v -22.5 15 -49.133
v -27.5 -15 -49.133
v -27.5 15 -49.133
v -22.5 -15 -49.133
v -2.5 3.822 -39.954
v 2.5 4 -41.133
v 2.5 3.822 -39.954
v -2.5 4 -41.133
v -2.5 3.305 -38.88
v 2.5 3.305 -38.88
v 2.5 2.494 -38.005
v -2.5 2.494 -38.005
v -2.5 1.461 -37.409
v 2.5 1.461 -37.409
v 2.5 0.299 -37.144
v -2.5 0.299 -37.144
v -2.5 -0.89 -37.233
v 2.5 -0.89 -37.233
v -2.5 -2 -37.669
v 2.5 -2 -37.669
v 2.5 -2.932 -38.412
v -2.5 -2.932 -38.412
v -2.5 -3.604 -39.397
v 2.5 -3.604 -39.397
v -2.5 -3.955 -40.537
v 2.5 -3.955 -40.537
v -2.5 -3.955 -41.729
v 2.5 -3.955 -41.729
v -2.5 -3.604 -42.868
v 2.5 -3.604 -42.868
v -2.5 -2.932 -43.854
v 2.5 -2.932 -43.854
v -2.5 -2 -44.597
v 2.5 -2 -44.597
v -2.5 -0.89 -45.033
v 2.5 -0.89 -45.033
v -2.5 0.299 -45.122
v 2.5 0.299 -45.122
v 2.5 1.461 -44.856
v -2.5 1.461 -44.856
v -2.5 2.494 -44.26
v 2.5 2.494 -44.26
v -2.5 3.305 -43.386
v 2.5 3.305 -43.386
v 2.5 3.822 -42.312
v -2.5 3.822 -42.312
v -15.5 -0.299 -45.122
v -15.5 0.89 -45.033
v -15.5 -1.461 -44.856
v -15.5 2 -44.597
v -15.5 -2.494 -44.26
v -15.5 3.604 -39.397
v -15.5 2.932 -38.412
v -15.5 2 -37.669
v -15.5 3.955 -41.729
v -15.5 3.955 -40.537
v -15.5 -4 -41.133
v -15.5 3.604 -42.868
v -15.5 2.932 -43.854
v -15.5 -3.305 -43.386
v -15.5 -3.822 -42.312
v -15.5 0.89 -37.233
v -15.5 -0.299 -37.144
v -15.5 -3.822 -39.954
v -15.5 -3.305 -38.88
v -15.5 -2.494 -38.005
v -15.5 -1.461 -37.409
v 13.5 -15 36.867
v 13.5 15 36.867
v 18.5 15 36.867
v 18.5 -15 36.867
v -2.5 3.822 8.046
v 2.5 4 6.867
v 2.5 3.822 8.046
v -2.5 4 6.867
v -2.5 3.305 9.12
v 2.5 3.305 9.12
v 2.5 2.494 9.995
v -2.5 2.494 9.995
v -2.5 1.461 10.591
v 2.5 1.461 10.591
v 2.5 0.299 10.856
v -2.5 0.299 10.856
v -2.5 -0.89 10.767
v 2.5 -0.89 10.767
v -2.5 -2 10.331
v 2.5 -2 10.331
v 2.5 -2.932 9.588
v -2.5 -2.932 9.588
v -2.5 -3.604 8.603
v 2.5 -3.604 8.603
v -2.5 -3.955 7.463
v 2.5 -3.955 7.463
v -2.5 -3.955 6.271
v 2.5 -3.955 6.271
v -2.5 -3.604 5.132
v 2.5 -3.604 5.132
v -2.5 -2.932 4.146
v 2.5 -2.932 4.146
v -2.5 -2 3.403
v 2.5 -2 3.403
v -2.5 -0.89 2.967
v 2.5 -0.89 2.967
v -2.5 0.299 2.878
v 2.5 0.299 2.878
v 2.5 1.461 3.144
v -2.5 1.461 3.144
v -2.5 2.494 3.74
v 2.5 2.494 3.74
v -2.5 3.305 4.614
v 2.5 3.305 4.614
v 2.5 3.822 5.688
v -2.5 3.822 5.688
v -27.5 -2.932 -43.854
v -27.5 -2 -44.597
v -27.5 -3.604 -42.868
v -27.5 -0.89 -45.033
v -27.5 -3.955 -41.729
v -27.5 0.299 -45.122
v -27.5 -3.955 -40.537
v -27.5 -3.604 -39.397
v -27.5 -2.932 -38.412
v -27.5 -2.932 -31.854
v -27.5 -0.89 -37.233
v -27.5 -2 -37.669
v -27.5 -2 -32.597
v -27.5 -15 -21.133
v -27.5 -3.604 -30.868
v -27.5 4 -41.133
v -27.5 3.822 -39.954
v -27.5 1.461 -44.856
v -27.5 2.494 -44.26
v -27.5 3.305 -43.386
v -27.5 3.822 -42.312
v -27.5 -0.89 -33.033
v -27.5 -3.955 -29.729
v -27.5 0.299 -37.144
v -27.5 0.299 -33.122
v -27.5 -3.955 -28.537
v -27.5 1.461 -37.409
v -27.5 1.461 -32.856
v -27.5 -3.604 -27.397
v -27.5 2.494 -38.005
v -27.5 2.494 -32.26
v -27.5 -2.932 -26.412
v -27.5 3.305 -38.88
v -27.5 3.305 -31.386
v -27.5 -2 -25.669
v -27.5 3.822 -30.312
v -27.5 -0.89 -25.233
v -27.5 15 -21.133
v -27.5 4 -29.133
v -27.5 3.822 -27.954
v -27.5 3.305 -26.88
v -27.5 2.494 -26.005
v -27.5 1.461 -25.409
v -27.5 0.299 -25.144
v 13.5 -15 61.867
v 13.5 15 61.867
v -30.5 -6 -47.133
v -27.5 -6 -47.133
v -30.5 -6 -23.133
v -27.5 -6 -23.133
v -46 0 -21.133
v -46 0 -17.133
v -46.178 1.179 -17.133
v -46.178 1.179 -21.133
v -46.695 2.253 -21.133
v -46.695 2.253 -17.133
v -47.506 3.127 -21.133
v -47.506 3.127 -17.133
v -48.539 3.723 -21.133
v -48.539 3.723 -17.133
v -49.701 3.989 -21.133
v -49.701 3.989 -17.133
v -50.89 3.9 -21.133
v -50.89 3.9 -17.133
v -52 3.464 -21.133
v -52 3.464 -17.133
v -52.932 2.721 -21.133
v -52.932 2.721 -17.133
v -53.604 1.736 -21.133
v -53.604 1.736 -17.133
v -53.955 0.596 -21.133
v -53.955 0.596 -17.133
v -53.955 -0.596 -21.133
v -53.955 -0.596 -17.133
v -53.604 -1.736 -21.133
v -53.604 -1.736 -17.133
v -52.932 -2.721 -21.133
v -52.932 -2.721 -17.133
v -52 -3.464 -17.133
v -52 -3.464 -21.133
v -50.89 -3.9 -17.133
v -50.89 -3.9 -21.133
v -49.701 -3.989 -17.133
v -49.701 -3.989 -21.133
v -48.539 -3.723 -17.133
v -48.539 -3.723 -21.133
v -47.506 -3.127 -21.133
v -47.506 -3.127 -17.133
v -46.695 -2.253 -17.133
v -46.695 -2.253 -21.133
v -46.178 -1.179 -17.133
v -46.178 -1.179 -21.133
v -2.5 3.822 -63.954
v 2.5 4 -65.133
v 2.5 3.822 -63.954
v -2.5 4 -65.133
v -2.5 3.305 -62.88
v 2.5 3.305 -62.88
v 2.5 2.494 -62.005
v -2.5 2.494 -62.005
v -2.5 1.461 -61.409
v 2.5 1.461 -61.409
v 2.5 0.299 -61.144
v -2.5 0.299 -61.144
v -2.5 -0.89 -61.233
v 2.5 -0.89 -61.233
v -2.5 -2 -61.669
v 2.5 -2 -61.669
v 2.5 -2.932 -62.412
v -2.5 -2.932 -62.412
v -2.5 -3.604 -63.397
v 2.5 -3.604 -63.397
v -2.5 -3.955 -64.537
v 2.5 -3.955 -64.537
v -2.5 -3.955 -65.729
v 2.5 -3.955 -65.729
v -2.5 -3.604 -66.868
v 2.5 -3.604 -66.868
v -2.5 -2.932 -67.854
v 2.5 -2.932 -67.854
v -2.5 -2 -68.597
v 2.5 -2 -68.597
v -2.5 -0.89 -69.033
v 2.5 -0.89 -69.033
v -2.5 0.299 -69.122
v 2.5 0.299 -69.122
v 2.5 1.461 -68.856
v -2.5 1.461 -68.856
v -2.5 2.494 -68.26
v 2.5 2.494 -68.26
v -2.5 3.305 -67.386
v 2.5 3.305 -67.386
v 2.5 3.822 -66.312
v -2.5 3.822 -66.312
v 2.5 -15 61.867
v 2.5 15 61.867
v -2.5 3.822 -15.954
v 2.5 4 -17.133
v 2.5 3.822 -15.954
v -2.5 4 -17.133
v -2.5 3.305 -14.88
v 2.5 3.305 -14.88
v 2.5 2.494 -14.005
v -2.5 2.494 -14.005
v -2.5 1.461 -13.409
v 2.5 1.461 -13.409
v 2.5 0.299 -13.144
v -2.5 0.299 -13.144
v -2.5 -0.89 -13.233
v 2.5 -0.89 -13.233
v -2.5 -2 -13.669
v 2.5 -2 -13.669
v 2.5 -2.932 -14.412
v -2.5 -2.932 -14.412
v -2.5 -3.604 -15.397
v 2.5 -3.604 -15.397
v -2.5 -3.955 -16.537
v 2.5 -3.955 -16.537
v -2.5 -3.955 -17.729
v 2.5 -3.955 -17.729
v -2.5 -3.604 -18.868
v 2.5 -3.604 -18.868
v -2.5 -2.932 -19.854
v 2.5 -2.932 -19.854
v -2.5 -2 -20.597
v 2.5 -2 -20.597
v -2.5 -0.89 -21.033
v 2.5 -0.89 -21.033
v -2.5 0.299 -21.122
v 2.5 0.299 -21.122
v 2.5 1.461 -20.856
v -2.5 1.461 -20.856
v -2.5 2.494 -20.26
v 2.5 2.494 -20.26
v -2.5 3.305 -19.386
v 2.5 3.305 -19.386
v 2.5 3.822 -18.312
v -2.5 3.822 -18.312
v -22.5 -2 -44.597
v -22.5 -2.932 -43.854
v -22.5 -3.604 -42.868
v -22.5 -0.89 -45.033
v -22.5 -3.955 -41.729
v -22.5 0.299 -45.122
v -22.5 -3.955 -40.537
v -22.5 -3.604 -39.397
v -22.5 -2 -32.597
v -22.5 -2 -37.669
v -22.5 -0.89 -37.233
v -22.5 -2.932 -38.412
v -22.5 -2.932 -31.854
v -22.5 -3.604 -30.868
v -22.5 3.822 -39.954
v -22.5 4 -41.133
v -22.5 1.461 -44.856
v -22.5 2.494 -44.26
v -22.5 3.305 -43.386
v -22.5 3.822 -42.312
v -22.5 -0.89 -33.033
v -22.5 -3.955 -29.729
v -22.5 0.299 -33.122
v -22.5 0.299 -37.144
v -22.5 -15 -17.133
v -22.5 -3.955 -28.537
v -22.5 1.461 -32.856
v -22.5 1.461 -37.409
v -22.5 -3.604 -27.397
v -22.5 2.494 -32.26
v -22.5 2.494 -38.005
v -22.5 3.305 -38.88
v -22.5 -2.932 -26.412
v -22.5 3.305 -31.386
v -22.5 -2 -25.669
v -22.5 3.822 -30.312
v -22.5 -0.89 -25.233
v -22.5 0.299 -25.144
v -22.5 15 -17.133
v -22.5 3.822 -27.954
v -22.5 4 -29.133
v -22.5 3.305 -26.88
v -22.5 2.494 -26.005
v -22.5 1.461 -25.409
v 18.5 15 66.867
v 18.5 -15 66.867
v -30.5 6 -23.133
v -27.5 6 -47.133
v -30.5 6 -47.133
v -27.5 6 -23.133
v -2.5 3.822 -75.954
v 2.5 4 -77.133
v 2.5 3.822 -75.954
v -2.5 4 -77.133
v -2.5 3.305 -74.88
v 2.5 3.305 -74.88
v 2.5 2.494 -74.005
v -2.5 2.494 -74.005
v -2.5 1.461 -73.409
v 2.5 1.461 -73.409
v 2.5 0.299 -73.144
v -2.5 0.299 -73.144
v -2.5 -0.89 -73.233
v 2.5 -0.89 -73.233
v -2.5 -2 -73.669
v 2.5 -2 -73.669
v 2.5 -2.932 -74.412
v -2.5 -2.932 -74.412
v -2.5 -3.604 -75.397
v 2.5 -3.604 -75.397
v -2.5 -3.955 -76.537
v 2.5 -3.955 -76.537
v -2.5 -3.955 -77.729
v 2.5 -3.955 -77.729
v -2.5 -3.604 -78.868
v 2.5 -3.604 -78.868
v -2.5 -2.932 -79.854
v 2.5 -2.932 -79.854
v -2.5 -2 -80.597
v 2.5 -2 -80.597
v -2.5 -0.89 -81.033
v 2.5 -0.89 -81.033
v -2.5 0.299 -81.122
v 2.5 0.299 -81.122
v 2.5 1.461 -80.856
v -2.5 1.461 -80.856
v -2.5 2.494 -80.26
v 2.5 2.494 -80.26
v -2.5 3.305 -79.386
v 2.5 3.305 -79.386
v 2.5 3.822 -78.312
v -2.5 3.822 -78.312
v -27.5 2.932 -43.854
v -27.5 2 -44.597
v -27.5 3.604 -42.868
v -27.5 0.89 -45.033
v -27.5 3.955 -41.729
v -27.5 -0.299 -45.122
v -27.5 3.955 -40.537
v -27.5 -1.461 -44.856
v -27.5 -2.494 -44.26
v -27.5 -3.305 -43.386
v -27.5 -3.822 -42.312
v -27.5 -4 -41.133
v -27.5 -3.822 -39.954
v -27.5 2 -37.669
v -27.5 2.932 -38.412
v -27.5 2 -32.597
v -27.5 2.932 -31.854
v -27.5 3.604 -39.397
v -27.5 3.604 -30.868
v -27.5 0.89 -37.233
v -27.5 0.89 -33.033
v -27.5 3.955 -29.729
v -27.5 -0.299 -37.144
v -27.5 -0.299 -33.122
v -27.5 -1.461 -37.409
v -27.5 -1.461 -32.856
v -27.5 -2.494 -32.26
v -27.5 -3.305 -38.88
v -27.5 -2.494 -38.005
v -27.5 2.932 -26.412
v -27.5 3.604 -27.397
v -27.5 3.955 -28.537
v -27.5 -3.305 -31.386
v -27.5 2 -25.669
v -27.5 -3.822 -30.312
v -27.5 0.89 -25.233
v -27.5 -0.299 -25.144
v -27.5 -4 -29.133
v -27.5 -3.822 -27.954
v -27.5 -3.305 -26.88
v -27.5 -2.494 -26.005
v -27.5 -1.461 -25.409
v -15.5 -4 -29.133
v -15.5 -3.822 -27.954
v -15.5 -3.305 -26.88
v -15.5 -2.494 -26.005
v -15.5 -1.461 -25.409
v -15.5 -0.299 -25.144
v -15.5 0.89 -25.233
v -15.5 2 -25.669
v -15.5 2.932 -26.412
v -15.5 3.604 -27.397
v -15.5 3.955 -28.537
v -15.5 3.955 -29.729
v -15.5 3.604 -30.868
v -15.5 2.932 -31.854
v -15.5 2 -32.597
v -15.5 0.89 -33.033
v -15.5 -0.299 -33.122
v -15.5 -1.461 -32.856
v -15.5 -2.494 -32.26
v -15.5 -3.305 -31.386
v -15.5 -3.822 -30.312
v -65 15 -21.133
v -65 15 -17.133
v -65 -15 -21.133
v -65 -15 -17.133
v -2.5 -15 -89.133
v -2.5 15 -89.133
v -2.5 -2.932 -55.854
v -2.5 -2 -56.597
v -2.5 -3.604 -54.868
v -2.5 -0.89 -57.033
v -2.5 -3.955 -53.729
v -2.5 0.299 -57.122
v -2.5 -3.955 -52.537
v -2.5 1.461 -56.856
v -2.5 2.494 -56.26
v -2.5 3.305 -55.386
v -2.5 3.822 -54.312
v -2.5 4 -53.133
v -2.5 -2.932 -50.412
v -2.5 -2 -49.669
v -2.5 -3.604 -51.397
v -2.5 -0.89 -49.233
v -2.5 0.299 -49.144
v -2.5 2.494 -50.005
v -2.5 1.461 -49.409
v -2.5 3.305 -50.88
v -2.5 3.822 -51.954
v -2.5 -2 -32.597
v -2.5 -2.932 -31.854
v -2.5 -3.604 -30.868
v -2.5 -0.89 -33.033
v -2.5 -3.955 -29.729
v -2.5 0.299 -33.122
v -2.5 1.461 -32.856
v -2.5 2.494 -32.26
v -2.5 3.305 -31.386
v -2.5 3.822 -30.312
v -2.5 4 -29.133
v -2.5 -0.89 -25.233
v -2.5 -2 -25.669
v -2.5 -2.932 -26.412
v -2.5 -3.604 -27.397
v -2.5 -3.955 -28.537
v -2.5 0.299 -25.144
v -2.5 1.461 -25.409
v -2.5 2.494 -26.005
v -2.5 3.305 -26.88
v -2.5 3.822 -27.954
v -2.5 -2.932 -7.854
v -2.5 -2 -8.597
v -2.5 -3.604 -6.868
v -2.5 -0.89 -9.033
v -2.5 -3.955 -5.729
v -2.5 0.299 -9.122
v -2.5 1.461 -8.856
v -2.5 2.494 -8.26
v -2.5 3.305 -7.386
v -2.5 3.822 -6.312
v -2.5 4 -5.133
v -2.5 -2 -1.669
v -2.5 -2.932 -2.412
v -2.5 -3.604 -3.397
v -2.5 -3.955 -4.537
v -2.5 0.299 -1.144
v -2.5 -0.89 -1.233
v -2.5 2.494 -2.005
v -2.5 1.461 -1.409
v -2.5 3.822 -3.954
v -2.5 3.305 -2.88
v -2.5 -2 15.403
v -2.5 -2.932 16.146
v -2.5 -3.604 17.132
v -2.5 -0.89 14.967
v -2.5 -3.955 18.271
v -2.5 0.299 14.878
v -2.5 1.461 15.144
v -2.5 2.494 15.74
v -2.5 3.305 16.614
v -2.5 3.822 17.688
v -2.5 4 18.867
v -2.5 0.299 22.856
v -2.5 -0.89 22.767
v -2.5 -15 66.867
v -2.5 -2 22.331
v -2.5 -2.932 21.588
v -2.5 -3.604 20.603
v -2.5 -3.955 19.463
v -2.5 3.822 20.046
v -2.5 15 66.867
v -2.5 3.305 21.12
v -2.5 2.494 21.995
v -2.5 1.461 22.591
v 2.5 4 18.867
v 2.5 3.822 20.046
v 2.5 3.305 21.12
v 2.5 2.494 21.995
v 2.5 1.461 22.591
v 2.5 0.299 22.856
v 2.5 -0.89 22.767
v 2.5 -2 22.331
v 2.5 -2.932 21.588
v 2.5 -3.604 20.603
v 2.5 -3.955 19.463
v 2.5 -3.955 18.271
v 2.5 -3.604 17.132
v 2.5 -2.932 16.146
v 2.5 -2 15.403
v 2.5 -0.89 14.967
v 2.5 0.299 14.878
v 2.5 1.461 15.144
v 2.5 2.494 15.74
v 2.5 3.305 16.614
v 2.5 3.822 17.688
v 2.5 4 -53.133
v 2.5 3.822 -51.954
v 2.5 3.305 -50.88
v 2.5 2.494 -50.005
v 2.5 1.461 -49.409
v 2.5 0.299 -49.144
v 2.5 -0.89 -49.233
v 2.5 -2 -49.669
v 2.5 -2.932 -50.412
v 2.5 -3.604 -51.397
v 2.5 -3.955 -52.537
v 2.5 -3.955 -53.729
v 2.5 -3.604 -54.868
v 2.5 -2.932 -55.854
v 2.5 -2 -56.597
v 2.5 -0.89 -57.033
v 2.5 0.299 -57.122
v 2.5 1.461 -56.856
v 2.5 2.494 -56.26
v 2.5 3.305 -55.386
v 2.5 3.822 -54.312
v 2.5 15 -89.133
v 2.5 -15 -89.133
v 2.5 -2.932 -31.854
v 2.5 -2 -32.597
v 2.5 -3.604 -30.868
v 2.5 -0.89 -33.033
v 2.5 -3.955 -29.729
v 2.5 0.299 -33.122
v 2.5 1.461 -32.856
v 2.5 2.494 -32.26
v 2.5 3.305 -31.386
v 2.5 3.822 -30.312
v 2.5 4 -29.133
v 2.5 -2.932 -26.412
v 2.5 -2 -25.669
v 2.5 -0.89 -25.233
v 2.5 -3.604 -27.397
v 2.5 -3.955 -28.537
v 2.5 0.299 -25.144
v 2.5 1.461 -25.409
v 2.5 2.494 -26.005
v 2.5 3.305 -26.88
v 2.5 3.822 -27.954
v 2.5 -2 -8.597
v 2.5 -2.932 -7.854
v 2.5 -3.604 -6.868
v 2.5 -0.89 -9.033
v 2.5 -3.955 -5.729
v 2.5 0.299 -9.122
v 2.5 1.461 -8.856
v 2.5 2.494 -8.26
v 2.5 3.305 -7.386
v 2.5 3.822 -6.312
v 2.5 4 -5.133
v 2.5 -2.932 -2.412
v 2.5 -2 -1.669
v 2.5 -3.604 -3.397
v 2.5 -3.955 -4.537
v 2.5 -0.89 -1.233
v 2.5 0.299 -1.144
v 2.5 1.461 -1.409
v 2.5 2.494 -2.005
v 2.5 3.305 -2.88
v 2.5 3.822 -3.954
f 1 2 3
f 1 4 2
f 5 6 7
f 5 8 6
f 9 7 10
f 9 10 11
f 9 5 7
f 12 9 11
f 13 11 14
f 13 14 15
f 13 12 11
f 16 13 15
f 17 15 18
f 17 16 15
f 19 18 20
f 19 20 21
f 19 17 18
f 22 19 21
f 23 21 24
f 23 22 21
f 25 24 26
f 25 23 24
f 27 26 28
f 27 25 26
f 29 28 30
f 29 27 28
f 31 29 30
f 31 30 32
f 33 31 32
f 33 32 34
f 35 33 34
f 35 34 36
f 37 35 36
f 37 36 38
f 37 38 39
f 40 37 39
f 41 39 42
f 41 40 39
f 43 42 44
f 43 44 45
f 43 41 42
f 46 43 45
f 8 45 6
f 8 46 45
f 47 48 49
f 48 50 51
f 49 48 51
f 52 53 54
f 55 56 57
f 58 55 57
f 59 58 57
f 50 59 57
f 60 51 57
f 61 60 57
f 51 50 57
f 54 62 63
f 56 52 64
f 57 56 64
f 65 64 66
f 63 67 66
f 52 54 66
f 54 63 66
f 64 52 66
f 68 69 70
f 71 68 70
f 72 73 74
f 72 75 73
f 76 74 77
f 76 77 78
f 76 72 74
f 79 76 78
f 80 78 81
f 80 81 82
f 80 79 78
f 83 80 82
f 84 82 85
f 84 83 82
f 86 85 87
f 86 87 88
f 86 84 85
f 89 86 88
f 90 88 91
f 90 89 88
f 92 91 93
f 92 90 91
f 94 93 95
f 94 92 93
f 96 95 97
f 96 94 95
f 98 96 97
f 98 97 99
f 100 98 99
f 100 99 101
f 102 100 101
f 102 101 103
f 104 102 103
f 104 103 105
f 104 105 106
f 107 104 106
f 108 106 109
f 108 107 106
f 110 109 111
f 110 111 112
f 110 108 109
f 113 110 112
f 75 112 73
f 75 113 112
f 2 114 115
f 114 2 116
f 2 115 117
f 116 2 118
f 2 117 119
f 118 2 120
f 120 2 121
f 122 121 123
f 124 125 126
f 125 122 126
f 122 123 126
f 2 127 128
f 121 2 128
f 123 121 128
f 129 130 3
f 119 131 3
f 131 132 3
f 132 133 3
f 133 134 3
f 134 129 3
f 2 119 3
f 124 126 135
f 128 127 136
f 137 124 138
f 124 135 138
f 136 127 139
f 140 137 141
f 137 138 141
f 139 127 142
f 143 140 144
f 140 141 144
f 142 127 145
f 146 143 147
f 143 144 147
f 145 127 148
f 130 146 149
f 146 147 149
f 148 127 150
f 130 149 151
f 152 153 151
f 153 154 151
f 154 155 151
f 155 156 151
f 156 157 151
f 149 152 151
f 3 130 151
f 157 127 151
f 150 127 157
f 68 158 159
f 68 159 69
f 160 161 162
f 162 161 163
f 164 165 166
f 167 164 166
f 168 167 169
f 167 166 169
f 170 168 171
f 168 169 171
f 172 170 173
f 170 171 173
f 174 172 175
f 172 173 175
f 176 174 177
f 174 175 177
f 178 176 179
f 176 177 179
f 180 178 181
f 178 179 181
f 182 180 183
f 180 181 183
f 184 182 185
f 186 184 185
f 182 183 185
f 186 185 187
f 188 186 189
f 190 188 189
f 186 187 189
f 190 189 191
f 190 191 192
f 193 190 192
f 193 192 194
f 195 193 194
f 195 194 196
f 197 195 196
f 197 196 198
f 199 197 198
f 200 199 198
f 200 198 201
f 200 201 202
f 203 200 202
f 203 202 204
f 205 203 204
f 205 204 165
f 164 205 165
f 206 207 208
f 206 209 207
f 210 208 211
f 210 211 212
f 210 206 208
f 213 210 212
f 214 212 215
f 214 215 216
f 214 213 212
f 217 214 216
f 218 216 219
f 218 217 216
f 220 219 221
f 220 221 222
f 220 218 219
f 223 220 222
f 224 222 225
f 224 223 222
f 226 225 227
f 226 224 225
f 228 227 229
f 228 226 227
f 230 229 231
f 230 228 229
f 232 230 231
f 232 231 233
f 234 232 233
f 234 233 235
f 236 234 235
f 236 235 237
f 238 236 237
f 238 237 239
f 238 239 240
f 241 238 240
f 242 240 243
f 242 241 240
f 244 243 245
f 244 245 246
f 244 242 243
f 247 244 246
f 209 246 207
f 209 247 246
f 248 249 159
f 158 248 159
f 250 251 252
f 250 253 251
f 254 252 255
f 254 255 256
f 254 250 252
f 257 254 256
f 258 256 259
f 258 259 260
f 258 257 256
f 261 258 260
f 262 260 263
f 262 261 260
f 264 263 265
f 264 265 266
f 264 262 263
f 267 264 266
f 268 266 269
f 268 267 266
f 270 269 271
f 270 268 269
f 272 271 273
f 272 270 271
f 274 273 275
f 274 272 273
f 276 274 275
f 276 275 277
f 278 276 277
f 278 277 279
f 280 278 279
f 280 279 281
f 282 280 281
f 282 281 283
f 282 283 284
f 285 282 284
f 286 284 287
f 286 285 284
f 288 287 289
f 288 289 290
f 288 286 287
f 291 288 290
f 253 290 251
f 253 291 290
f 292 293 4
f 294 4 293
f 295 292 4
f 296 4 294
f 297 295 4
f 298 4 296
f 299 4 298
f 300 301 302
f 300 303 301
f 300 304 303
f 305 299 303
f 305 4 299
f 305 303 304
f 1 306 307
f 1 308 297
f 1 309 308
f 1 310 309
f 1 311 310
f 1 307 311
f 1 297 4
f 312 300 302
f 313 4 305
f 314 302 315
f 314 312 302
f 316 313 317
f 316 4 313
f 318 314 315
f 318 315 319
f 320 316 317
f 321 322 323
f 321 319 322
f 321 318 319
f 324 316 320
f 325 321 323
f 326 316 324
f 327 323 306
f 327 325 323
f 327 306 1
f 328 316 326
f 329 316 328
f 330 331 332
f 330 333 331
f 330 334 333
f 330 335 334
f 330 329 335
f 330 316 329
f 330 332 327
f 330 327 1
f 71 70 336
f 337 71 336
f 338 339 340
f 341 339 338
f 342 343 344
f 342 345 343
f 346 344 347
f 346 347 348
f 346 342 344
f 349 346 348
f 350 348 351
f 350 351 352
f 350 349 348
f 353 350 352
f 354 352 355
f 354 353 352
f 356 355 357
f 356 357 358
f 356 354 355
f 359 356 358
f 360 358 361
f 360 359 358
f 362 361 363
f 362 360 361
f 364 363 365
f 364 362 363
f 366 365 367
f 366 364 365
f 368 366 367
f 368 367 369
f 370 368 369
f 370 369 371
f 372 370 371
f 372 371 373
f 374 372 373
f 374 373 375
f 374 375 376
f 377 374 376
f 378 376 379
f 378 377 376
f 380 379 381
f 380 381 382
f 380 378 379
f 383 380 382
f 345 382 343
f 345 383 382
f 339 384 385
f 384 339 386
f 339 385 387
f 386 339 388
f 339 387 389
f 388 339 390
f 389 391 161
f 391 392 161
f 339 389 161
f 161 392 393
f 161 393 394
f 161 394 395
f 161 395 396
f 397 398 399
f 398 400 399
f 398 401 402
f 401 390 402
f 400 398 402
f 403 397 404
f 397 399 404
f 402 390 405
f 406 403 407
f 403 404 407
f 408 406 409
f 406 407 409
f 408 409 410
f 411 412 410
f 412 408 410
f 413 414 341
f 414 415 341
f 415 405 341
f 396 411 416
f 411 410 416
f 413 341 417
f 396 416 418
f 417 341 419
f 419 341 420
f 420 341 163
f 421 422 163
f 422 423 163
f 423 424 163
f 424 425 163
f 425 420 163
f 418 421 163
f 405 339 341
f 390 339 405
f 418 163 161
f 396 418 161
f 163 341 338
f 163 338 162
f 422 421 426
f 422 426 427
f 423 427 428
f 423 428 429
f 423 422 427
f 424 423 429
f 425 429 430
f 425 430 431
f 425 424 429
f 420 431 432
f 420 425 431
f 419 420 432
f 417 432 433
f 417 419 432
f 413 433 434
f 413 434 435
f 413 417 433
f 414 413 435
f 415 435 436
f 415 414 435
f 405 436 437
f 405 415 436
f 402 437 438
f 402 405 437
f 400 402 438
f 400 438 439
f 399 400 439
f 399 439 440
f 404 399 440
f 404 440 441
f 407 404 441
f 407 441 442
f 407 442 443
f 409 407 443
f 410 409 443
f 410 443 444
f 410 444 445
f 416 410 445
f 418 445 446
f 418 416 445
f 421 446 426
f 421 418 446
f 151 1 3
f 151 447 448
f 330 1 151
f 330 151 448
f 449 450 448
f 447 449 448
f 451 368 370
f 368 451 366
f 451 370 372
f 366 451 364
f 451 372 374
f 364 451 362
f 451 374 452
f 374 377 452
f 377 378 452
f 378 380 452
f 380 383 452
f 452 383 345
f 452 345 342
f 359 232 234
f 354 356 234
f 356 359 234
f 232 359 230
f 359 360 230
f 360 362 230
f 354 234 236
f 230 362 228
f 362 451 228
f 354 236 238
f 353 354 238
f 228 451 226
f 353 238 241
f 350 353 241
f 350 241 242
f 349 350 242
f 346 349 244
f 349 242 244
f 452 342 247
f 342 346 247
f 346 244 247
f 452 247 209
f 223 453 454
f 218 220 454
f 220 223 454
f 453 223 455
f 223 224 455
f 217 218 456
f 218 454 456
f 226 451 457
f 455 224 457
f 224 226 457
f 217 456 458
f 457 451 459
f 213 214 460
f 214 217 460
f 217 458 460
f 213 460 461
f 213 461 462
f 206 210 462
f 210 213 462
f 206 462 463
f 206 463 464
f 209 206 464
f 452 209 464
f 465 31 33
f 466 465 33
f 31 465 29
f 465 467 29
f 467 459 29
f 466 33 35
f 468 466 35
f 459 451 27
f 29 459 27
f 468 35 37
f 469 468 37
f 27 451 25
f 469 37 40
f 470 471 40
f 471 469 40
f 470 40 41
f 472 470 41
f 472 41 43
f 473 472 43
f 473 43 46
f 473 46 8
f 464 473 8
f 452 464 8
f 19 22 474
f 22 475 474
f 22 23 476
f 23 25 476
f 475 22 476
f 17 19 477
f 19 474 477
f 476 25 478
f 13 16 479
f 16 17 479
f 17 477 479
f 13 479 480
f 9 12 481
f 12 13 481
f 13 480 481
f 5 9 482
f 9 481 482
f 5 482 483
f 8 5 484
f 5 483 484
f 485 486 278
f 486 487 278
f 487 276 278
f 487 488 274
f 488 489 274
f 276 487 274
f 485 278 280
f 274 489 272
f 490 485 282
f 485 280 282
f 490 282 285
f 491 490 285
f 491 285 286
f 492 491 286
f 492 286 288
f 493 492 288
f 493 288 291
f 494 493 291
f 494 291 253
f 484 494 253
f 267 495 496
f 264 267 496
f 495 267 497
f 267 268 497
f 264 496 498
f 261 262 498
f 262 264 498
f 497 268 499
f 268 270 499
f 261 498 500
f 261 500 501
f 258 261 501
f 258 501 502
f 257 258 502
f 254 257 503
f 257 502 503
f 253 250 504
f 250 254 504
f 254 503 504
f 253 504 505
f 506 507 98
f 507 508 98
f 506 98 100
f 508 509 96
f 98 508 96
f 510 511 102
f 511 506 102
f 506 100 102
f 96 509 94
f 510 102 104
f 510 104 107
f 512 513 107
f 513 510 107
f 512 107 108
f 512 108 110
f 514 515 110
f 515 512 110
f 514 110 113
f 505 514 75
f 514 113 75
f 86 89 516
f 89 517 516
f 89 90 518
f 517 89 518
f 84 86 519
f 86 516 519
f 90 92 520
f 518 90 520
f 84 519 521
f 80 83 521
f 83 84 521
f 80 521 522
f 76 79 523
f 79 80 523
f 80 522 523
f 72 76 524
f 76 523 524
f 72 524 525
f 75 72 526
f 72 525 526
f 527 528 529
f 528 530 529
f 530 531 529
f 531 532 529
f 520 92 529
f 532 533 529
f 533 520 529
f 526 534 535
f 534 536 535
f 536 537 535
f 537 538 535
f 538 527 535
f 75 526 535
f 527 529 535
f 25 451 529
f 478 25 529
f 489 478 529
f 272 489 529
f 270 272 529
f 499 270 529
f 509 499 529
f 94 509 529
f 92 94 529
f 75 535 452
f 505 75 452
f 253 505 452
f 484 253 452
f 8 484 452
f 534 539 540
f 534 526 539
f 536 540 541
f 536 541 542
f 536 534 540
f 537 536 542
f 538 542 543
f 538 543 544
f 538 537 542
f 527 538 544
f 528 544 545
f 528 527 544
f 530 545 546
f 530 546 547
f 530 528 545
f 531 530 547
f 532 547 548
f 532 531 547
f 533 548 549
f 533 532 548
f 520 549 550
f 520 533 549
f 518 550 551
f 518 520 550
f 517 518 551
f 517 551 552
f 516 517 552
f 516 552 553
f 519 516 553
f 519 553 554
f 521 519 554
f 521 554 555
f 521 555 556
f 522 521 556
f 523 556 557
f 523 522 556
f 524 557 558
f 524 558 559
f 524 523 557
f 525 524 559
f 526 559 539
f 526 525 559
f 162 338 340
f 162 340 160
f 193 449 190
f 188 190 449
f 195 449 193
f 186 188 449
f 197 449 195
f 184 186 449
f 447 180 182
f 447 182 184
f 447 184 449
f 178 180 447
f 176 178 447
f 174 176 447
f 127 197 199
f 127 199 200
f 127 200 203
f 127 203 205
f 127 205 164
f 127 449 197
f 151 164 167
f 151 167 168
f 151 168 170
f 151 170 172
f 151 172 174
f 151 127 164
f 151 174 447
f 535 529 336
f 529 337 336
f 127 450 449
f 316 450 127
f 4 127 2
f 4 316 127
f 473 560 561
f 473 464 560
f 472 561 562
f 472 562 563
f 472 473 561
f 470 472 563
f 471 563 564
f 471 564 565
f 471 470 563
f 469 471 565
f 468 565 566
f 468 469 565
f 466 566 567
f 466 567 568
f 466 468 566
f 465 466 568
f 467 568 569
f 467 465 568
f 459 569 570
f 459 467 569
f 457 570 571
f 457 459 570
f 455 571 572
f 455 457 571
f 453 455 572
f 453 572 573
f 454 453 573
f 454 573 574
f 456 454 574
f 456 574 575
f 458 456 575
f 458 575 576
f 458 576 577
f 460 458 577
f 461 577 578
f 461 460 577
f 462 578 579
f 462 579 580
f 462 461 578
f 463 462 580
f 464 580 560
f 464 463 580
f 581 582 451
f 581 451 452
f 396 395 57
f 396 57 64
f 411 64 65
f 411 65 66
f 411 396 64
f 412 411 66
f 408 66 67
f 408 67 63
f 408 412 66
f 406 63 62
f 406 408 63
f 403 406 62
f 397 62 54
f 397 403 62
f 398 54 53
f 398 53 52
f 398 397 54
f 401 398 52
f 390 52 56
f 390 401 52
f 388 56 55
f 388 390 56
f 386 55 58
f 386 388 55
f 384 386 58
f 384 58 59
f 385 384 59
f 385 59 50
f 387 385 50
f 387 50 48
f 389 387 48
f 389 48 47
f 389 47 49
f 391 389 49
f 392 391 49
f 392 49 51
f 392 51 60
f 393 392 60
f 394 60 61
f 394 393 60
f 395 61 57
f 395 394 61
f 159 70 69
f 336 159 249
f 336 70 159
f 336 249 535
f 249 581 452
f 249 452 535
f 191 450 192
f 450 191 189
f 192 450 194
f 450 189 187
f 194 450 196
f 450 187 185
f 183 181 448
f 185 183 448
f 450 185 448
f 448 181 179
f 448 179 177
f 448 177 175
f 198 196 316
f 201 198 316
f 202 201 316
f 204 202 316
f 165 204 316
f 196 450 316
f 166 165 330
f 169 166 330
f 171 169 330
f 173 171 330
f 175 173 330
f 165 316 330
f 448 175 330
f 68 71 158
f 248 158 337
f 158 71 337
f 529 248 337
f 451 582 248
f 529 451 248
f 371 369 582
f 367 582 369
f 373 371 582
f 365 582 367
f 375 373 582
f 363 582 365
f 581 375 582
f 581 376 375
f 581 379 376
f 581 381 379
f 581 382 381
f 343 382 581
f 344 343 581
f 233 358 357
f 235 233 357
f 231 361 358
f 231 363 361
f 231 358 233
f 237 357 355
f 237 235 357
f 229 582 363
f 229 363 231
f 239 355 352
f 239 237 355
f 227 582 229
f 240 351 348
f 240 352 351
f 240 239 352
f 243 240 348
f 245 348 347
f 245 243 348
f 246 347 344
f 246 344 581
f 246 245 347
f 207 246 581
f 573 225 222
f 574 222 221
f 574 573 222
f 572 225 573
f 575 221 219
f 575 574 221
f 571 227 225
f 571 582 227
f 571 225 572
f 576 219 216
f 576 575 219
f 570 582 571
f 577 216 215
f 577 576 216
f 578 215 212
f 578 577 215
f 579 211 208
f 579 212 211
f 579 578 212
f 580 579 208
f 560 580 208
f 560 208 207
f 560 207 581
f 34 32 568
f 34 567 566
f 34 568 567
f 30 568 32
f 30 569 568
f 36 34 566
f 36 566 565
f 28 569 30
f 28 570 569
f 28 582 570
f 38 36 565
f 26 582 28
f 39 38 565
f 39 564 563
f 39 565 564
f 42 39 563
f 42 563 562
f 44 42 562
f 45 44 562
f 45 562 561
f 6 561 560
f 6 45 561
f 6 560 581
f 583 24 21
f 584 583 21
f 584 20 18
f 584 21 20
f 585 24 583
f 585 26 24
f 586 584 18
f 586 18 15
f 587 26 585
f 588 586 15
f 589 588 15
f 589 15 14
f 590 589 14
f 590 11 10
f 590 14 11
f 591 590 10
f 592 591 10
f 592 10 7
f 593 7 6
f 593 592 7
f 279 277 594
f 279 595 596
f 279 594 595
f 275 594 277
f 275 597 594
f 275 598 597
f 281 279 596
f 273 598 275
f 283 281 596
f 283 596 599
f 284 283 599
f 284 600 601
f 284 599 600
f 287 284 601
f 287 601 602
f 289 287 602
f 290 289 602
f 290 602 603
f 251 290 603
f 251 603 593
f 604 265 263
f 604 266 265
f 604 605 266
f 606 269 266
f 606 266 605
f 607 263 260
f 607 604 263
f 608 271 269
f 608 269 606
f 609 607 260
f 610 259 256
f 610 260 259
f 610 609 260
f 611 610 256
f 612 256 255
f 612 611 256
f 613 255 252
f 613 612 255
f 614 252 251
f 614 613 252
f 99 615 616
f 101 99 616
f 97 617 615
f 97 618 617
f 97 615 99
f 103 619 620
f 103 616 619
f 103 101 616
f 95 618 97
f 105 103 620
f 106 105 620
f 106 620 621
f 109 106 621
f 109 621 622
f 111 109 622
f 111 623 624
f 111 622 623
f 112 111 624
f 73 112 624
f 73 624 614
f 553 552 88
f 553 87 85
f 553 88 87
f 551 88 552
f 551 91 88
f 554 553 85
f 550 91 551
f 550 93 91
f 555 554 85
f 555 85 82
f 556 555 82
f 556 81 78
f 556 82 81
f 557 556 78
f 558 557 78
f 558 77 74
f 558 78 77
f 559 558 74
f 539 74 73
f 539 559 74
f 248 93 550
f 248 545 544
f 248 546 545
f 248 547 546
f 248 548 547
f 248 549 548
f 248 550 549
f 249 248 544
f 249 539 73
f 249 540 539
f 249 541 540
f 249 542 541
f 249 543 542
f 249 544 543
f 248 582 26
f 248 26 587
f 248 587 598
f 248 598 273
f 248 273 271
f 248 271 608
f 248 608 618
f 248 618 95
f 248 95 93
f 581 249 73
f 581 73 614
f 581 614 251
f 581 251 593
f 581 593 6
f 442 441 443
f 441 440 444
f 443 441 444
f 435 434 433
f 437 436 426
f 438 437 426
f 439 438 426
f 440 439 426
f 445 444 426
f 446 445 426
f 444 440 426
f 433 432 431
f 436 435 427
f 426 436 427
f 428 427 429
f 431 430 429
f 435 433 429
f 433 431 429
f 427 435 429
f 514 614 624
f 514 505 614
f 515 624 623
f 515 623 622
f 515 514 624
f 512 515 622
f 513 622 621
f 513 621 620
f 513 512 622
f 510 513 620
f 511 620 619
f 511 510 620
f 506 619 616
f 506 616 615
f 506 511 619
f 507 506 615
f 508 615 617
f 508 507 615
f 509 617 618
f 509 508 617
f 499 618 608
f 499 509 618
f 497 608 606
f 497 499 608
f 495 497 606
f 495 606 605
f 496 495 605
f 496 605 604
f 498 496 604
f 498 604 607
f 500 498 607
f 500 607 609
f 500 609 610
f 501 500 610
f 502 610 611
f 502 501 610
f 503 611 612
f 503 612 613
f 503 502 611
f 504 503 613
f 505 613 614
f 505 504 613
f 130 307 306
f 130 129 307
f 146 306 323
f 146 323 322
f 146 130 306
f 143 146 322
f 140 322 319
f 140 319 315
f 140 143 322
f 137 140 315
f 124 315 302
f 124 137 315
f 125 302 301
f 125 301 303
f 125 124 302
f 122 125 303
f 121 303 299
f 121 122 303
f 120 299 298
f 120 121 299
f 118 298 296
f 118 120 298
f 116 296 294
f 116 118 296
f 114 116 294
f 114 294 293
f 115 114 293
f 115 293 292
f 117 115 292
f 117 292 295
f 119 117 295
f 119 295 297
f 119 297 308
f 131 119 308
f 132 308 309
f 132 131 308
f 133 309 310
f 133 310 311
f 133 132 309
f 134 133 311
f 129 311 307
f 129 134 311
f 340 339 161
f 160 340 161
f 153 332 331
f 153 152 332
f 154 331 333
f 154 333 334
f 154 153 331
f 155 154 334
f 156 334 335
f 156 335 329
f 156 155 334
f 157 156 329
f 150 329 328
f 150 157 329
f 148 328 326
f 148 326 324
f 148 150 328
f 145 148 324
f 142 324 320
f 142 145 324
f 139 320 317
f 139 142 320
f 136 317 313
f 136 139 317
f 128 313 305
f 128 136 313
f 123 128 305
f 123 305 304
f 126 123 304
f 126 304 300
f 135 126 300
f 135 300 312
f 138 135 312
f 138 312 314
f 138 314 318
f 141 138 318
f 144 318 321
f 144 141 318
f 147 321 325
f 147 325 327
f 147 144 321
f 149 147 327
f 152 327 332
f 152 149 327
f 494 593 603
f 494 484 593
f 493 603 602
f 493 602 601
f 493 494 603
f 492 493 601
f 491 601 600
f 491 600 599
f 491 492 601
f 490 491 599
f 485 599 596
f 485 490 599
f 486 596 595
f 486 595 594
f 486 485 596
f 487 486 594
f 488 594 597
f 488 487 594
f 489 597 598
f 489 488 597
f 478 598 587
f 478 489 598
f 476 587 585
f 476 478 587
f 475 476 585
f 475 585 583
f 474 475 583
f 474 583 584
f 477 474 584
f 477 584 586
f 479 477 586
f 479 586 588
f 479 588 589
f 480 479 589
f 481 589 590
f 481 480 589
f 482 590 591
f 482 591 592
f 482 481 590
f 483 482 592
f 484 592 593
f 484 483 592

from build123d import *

# Parameters (mm, degrees)
F1_W           = 30
F1_H           = 156
F1_R           = 4
F2_DEPTH       = 2.5
F2_DEPTH_BACK  = 2.5
F4_DEPTH       = 15
F4_DEPTH_BACK  = 15
F6_W           = 30
F6_H           = 28
F6_R           = 4
F6_H_2         = 4
F7_DEPTH       = 2.5
F7_DEPTH_BACK  = 2.5
F8_DEPTH       = 40
F9_R           = 4
F10_DEPTH      = 5
F10_DEPTH_BACK = 5
F11_W          = 12
F11_H          = 24
F12_DEPTH      = 3
F11_R          = 4
F13_DEPTH      = 12
F13_DEPTH_BACK = 3


with BuildPart() as f2:
    # F1 (on Right) → F2 (new body, two sides)
    with BuildSketch(Plane.YZ) as f2_sk:
        with Locations((0, -11.1328125)):
            Rectangle(F1_W, F1_H)
        with Locations((0, -77.1328125)):
            Circle(F1_R, mode=Mode.SUBTRACT)
        with Locations((0, -65.1328125)):
            Circle(F1_R, mode=Mode.SUBTRACT)
        with Locations((0, -53.1328125)):
            Circle(F1_R, mode=Mode.SUBTRACT)
        with Locations((0, -41.1328125)):
            Circle(F1_R, mode=Mode.SUBTRACT)
        with Locations((0, -29.1328125)):
            Circle(F1_R, mode=Mode.SUBTRACT)
        with Locations((0, -17.1328125)):
            Circle(F1_R, mode=Mode.SUBTRACT)
        with Locations((0, -5.1328125)):
            Circle(F1_R, mode=Mode.SUBTRACT)
        with Locations((0, 6.8671875)):
            Circle(F1_R, mode=Mode.SUBTRACT)
        with Locations((0, 18.8671875)):
            Circle(F1_R, mode=Mode.SUBTRACT)
    extrude(amount=F2_DEPTH)
    extrude(f2_sk.sketch, amount=-F2_DEPTH_BACK)

    # F3 (on Front) → F4 (join, two sides)
    with BuildSketch(Plane.XZ) as f4_sk:
        Polygon((2.5, 66.8671875), (-2.5, 66.8671875), (-2.5, 61.8671875), (13.5, 61.8671875), (13.5, 36.8671875), (18.5, 36.8671875), (18.5, 61.8671875), (18.5, 66.8671875), (13.5, 66.8671875), align=None)
    extrude(amount=F4_DEPTH)
    extrude(f4_sk.sketch, amount=-F4_DEPTH_BACK)


with BuildPart() as f7:
    # F6 (on offset) → F7 (new body, two sides)
    with BuildSketch(Plane.YZ.offset(-25)) as f7_sk:
        with Locations((0, -35.1328125)):
            Rectangle(F6_W, F6_H)
        with Locations((0, -41.1328125)):
            Circle(F6_R, mode=Mode.SUBTRACT)
        with Locations((0, -29.1328125)):
            Circle(F6_R, mode=Mode.SUBTRACT)
        with Locations((0, -19.1328125)):
            Rectangle(F6_W, F6_H_2)
    extrude(amount=F7_DEPTH)
    extrude(f7_sk.sketch, amount=-F7_DEPTH_BACK)

    # F6 (on offset) → F8 (join)
    with BuildSketch(Plane.YZ.offset(-25)):
        with Locations((0, -19.1328125)):
            Rectangle(F6_W, F6_H_2)
    extrude(amount=-F8_DEPTH)

    # F9 (on face) → F10 (cut, two sides)
    with BuildSketch(Plane.XY.offset(-17.1328125)) as f10_sk:
        with Locations((-50, 0)):
            Circle(F9_R)
    extrude(amount=F10_DEPTH, mode=Mode.SUBTRACT)
    extrude(f10_sk.sketch, amount=-F10_DEPTH_BACK, mode=Mode.SUBTRACT)


with BuildPart() as f12:
    # F11 (on face) → F12 (new body)
    with BuildSketch(Plane(origin=(-27.5, 0, 0), x_dir=(0, -1, 0), z_dir=(-1, 0, 0))):
        with Locations((0, -35.1328125)):
            Rectangle(F11_W, F11_H)
    extrude(amount=F12_DEPTH)

    # F11 (on face) → F13 (join, two sides)
    with BuildSketch(Plane(origin=(-27.5, 0, 0), x_dir=(0, -1, 0), z_dir=(-1, 0, 0))) as f13_sk:
        with Locations((0, -29.1328125)):
            Circle(F11_R)
        with Locations((0, -41.1328125)):
            Circle(F11_R)
    extrude(amount=-F13_DEPTH)
    extrude(f13_sk.sketch, amount=F13_DEPTH_BACK)


solid = Compound([f2.part, f7.part, f12.part])
